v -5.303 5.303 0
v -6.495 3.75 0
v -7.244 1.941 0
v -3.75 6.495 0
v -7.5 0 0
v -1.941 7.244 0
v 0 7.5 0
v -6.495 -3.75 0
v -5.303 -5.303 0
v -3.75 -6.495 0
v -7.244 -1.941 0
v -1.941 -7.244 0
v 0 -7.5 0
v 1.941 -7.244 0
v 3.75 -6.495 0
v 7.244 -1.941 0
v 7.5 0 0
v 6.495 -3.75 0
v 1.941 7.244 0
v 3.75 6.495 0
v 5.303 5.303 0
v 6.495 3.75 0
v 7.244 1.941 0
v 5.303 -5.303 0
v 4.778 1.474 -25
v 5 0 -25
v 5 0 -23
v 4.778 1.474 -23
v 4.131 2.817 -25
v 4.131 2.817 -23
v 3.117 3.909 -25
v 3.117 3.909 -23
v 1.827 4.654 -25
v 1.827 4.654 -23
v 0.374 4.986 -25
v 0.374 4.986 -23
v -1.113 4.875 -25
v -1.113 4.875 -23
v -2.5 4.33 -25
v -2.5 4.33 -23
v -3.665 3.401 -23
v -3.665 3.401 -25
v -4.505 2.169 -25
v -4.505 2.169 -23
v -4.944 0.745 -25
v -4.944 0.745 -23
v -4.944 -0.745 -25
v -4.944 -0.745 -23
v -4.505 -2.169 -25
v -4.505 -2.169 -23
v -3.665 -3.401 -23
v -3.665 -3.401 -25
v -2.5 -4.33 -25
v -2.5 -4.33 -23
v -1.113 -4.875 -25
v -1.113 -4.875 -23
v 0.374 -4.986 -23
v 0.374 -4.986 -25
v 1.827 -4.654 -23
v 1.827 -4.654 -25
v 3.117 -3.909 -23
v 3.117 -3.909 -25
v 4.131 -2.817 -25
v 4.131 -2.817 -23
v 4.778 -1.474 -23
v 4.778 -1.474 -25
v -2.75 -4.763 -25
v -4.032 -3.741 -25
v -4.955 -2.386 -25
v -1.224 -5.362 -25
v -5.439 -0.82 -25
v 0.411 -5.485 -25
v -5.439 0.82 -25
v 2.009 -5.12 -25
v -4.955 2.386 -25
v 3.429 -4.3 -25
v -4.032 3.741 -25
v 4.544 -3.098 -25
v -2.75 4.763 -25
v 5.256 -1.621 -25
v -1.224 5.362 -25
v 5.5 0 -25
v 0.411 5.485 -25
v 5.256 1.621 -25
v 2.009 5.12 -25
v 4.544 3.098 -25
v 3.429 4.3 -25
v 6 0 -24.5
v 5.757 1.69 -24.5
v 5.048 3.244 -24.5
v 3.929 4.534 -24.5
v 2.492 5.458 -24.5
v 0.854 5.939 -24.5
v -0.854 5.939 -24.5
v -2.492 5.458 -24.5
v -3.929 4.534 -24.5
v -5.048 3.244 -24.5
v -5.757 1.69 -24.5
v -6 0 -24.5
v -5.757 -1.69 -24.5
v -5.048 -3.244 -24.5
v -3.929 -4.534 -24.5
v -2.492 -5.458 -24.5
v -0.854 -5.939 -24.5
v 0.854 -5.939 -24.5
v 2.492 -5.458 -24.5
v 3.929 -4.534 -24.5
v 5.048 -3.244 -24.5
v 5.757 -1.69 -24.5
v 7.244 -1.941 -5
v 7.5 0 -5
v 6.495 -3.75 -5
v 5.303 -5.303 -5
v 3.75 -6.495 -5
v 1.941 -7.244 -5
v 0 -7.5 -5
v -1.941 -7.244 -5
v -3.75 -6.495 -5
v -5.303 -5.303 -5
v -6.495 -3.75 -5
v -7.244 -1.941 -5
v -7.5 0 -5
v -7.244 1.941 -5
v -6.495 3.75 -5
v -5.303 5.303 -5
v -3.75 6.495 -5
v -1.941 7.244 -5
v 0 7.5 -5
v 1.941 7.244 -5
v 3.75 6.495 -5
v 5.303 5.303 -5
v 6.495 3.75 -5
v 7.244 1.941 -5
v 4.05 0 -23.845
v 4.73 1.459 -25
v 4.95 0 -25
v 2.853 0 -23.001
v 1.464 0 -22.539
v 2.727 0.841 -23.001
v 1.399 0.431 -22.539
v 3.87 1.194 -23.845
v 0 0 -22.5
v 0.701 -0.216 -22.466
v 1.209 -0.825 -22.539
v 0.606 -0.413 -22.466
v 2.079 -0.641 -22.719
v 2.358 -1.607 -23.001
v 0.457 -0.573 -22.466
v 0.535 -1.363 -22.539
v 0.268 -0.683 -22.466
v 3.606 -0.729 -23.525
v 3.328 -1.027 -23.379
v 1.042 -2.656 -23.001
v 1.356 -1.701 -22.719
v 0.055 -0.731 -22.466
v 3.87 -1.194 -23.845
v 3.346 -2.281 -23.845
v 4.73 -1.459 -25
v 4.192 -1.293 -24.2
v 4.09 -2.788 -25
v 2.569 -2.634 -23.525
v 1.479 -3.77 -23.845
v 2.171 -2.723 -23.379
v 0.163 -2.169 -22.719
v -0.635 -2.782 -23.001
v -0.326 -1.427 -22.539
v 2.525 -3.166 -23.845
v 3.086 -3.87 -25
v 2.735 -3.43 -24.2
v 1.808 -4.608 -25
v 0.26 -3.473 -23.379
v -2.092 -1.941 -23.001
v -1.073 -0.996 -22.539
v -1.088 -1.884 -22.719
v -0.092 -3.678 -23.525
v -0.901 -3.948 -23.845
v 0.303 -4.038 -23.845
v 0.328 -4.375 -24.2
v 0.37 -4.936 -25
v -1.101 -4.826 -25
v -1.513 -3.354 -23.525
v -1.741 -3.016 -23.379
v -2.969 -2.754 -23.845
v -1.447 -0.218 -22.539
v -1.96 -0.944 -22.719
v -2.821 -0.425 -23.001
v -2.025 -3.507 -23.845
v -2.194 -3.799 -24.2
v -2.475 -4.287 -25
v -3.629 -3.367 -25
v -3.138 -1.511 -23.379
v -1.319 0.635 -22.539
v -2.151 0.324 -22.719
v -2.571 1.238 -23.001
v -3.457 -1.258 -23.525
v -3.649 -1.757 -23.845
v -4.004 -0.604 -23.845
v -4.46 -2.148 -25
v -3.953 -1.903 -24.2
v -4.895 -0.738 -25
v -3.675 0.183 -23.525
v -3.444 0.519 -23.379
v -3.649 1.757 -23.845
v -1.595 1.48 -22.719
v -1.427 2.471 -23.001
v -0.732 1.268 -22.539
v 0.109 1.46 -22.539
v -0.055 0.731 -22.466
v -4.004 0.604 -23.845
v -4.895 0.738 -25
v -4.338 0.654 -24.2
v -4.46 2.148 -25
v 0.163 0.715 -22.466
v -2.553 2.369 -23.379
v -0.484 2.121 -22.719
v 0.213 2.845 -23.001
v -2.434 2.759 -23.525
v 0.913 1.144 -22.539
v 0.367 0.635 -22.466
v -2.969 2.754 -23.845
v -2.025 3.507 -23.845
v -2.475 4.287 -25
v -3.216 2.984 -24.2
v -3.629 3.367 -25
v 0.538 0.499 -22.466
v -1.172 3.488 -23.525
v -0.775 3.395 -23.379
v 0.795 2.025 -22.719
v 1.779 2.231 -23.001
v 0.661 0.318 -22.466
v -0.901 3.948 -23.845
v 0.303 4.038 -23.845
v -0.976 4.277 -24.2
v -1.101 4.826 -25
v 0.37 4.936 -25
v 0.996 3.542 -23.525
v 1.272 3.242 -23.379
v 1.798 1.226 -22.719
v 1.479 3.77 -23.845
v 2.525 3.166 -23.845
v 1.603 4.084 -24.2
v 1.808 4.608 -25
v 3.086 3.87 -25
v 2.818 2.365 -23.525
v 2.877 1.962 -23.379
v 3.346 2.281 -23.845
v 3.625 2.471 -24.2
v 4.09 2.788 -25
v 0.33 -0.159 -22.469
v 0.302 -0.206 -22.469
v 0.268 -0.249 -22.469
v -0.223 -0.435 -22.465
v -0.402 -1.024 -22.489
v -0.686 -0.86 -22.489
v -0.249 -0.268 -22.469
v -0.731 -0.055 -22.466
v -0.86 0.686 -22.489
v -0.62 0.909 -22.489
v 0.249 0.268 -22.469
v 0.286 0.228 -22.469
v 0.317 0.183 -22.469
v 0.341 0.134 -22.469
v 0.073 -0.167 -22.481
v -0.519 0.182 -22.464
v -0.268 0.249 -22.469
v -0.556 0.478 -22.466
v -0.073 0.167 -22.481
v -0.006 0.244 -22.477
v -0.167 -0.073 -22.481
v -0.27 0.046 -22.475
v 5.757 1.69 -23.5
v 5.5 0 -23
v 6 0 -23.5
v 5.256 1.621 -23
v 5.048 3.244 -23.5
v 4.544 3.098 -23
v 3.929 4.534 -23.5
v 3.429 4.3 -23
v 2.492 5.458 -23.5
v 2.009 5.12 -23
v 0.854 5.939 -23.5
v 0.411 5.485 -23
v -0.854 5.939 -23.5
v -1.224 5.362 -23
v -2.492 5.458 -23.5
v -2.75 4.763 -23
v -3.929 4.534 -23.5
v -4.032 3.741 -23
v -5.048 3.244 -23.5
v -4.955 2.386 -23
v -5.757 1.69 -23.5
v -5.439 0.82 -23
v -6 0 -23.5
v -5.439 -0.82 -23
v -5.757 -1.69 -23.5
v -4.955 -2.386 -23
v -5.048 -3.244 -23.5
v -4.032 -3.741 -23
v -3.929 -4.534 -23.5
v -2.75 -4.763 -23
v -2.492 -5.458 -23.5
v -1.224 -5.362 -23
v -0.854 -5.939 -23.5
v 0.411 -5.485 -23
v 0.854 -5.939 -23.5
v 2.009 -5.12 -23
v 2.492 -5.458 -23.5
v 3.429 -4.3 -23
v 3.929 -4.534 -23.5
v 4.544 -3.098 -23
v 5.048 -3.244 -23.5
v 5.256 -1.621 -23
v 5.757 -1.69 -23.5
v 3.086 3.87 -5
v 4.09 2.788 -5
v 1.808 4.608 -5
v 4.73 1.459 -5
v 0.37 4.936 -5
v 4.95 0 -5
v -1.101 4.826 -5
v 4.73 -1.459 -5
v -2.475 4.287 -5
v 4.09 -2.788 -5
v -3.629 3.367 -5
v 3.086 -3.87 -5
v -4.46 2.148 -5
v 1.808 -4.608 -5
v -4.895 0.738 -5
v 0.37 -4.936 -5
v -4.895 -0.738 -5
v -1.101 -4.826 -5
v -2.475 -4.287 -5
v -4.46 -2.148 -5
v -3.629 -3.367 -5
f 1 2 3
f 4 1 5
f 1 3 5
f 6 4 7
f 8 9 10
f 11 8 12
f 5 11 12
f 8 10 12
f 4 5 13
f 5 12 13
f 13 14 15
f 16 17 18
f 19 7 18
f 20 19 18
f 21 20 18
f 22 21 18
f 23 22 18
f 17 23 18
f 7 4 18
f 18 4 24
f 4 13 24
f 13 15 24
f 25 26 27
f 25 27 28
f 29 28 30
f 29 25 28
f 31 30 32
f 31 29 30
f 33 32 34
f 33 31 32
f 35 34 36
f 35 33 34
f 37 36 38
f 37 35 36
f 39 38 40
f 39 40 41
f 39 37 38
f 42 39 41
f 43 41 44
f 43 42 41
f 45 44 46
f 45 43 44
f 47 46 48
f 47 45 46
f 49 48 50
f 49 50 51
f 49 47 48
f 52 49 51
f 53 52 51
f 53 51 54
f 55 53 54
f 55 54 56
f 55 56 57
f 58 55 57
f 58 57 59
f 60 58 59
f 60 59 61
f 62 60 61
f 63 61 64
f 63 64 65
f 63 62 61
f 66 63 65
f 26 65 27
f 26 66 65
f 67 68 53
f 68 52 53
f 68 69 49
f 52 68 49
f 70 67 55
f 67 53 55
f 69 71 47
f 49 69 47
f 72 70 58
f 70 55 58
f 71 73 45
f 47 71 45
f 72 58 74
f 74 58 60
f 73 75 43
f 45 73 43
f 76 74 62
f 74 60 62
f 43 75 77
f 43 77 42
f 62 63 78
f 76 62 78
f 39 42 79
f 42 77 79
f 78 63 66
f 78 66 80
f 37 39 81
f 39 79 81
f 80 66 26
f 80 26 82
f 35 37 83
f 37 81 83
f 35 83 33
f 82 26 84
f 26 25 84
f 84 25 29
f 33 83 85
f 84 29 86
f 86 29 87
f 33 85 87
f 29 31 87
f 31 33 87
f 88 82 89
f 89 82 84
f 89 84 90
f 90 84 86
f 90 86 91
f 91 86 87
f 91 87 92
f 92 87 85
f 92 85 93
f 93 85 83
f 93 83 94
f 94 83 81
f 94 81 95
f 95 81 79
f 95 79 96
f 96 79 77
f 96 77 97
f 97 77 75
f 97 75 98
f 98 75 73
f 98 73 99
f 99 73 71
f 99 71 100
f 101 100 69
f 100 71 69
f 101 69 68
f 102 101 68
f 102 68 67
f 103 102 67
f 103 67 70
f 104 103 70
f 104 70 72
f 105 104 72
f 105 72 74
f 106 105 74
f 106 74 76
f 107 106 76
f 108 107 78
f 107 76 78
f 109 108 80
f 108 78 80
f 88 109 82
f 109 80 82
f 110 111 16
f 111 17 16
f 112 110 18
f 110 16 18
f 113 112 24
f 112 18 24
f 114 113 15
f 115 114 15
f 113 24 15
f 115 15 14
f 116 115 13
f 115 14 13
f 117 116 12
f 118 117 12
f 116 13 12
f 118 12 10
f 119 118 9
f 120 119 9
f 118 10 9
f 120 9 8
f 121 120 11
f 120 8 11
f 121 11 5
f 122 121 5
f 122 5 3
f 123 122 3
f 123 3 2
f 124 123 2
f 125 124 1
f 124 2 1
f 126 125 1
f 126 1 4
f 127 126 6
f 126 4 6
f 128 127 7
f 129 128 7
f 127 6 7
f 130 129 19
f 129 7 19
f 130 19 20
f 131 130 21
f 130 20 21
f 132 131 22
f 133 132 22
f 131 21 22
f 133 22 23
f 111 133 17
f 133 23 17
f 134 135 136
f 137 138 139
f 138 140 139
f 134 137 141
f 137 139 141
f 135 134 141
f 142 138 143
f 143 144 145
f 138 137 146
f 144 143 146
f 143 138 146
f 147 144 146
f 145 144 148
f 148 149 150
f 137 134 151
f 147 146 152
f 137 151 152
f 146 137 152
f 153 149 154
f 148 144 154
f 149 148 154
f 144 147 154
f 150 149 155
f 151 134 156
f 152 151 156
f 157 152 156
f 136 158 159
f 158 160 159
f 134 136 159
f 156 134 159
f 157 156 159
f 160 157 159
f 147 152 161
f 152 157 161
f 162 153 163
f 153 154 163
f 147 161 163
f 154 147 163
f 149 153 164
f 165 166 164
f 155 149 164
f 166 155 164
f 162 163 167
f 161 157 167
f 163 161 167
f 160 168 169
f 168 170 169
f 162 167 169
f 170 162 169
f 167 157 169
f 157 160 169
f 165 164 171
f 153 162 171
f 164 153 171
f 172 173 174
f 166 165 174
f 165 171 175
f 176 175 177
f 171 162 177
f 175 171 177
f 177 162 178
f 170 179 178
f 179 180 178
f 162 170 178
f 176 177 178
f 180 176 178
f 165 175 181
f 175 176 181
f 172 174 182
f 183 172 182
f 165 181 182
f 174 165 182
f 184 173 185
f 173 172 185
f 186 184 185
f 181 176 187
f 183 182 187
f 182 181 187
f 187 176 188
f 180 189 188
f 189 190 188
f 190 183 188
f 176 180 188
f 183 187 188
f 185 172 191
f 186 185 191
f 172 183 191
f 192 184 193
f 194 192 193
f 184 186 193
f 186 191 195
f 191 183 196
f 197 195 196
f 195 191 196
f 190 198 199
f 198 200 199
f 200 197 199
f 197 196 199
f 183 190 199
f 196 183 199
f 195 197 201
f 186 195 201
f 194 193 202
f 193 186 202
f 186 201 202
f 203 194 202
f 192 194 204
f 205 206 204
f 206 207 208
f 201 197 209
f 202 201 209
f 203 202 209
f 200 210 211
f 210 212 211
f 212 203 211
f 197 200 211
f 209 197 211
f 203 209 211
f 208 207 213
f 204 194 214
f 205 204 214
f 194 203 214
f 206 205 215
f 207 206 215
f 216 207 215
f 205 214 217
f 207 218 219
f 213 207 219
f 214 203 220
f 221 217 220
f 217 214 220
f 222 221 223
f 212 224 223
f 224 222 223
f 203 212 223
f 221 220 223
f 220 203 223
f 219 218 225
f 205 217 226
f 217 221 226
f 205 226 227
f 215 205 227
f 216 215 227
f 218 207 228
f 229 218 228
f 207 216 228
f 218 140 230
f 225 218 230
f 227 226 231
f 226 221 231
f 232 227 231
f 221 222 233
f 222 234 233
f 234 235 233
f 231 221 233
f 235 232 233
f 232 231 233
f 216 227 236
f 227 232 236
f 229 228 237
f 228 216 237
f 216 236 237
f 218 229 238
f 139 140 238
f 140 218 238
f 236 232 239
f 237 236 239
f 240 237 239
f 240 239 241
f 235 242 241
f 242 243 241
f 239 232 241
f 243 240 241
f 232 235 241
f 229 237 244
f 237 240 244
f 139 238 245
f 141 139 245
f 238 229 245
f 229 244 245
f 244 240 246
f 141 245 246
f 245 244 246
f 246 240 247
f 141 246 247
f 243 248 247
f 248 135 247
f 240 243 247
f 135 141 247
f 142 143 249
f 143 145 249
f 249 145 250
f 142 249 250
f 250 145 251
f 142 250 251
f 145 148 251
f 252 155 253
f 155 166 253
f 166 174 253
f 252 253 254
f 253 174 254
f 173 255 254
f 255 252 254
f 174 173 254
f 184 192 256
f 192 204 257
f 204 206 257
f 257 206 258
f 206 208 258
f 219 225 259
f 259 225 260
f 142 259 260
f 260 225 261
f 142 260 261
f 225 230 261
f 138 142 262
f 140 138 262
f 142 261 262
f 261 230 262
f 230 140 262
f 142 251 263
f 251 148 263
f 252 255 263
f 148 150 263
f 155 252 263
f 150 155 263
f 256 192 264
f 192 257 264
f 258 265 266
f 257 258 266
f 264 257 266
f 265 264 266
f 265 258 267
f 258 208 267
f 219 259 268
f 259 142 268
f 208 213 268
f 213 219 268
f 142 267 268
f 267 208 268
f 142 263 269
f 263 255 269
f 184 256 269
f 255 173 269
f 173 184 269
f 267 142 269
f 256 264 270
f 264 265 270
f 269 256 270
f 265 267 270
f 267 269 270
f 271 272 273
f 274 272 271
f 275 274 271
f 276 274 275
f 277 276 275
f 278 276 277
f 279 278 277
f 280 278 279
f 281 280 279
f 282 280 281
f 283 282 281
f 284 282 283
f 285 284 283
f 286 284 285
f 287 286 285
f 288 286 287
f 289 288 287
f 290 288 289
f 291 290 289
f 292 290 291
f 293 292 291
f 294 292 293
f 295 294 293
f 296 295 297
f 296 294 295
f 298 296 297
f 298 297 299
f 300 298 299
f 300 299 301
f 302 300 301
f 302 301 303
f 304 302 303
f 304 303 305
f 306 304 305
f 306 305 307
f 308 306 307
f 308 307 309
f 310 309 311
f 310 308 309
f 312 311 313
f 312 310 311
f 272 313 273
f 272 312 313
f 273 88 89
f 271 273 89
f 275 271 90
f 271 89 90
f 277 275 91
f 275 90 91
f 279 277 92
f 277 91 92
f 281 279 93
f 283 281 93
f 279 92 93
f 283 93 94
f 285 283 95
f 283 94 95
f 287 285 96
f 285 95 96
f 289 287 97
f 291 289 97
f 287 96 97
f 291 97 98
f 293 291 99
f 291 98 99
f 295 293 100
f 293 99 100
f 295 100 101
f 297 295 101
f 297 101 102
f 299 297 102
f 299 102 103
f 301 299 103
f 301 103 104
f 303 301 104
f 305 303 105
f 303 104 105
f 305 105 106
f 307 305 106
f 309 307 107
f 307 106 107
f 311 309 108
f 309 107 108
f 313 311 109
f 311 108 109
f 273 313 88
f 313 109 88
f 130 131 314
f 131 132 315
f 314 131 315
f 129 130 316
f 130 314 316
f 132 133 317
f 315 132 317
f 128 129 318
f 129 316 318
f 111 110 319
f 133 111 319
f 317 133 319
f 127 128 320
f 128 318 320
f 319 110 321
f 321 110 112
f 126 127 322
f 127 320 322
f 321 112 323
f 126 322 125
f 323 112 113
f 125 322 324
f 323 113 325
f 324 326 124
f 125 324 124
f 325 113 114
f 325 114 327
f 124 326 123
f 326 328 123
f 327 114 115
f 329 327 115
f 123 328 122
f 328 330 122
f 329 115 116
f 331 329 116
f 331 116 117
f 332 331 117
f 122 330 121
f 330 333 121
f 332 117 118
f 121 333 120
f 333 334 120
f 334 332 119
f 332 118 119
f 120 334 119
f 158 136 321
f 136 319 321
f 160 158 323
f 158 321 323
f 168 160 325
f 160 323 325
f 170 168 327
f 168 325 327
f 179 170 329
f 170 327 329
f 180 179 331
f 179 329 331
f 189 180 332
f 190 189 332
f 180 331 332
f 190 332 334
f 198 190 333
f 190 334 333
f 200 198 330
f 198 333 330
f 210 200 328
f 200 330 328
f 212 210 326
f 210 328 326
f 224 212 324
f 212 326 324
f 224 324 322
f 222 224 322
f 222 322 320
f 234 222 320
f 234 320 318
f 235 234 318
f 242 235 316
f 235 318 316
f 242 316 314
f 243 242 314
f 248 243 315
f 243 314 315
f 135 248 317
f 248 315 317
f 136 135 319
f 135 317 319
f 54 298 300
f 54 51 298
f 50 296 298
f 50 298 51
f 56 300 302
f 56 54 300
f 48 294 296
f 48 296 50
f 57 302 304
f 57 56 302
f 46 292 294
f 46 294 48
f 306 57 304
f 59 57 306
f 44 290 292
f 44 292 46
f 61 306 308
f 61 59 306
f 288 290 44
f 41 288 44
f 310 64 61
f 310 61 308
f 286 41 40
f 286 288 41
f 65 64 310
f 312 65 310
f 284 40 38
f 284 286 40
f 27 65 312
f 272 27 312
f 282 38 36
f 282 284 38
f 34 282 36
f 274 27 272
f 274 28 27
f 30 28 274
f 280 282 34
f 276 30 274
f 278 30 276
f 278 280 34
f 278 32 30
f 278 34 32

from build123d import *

# Parameters (mm, degrees)
F3_R     = 6
F3_R_2   = 5
F4_DEPTH = 2
F5_SIZE  = 0.5
F6_SIZE  = 0.5


with BuildPart() as f1:
    # F0 (on Front) → F1 (revolve)
    with BuildSketch(Plane.XZ):
        with BuildLine():
            Line((7.5, 0), (0, 0))
            Line((0, 0), (0, -22.5))
            ThreePointArc((0, -22.5), (2.853346, -23.000875), (4.95, -25))
            Line((4.95, -25), (4.95, -5))
            Line((4.95, -5), (7.5, -5))
            Line((7.5, -5), (7.5, 0))
        make_face()
    revolve(axis=Axis((0, 0, -11.25), (0, 0, -1)))


with BuildPart() as f4:
    # F3 (on offset) → F4 (new body)
    with BuildSketch(Plane.XY.offset(-25)):
        Circle(F3_R)
        Circle(F3_R_2, mode=Mode.SUBTRACT)
    extrude(amount=F4_DEPTH)

    # F5
    f5_edges = [f4.edges().sort_by_distance(p)[0] for p in [
        (-6, 0, -25),
    ]]
    chamfer(f5_edges, length=F5_SIZE)

    # F6
    f6_edges = [f4.edges().sort_by_distance(p)[0] for p in [
        (-6, 0, -23),
    ]]
    chamfer(f6_edges, length=F6_SIZE)


solid = Compound([f1.part, f4.part])
